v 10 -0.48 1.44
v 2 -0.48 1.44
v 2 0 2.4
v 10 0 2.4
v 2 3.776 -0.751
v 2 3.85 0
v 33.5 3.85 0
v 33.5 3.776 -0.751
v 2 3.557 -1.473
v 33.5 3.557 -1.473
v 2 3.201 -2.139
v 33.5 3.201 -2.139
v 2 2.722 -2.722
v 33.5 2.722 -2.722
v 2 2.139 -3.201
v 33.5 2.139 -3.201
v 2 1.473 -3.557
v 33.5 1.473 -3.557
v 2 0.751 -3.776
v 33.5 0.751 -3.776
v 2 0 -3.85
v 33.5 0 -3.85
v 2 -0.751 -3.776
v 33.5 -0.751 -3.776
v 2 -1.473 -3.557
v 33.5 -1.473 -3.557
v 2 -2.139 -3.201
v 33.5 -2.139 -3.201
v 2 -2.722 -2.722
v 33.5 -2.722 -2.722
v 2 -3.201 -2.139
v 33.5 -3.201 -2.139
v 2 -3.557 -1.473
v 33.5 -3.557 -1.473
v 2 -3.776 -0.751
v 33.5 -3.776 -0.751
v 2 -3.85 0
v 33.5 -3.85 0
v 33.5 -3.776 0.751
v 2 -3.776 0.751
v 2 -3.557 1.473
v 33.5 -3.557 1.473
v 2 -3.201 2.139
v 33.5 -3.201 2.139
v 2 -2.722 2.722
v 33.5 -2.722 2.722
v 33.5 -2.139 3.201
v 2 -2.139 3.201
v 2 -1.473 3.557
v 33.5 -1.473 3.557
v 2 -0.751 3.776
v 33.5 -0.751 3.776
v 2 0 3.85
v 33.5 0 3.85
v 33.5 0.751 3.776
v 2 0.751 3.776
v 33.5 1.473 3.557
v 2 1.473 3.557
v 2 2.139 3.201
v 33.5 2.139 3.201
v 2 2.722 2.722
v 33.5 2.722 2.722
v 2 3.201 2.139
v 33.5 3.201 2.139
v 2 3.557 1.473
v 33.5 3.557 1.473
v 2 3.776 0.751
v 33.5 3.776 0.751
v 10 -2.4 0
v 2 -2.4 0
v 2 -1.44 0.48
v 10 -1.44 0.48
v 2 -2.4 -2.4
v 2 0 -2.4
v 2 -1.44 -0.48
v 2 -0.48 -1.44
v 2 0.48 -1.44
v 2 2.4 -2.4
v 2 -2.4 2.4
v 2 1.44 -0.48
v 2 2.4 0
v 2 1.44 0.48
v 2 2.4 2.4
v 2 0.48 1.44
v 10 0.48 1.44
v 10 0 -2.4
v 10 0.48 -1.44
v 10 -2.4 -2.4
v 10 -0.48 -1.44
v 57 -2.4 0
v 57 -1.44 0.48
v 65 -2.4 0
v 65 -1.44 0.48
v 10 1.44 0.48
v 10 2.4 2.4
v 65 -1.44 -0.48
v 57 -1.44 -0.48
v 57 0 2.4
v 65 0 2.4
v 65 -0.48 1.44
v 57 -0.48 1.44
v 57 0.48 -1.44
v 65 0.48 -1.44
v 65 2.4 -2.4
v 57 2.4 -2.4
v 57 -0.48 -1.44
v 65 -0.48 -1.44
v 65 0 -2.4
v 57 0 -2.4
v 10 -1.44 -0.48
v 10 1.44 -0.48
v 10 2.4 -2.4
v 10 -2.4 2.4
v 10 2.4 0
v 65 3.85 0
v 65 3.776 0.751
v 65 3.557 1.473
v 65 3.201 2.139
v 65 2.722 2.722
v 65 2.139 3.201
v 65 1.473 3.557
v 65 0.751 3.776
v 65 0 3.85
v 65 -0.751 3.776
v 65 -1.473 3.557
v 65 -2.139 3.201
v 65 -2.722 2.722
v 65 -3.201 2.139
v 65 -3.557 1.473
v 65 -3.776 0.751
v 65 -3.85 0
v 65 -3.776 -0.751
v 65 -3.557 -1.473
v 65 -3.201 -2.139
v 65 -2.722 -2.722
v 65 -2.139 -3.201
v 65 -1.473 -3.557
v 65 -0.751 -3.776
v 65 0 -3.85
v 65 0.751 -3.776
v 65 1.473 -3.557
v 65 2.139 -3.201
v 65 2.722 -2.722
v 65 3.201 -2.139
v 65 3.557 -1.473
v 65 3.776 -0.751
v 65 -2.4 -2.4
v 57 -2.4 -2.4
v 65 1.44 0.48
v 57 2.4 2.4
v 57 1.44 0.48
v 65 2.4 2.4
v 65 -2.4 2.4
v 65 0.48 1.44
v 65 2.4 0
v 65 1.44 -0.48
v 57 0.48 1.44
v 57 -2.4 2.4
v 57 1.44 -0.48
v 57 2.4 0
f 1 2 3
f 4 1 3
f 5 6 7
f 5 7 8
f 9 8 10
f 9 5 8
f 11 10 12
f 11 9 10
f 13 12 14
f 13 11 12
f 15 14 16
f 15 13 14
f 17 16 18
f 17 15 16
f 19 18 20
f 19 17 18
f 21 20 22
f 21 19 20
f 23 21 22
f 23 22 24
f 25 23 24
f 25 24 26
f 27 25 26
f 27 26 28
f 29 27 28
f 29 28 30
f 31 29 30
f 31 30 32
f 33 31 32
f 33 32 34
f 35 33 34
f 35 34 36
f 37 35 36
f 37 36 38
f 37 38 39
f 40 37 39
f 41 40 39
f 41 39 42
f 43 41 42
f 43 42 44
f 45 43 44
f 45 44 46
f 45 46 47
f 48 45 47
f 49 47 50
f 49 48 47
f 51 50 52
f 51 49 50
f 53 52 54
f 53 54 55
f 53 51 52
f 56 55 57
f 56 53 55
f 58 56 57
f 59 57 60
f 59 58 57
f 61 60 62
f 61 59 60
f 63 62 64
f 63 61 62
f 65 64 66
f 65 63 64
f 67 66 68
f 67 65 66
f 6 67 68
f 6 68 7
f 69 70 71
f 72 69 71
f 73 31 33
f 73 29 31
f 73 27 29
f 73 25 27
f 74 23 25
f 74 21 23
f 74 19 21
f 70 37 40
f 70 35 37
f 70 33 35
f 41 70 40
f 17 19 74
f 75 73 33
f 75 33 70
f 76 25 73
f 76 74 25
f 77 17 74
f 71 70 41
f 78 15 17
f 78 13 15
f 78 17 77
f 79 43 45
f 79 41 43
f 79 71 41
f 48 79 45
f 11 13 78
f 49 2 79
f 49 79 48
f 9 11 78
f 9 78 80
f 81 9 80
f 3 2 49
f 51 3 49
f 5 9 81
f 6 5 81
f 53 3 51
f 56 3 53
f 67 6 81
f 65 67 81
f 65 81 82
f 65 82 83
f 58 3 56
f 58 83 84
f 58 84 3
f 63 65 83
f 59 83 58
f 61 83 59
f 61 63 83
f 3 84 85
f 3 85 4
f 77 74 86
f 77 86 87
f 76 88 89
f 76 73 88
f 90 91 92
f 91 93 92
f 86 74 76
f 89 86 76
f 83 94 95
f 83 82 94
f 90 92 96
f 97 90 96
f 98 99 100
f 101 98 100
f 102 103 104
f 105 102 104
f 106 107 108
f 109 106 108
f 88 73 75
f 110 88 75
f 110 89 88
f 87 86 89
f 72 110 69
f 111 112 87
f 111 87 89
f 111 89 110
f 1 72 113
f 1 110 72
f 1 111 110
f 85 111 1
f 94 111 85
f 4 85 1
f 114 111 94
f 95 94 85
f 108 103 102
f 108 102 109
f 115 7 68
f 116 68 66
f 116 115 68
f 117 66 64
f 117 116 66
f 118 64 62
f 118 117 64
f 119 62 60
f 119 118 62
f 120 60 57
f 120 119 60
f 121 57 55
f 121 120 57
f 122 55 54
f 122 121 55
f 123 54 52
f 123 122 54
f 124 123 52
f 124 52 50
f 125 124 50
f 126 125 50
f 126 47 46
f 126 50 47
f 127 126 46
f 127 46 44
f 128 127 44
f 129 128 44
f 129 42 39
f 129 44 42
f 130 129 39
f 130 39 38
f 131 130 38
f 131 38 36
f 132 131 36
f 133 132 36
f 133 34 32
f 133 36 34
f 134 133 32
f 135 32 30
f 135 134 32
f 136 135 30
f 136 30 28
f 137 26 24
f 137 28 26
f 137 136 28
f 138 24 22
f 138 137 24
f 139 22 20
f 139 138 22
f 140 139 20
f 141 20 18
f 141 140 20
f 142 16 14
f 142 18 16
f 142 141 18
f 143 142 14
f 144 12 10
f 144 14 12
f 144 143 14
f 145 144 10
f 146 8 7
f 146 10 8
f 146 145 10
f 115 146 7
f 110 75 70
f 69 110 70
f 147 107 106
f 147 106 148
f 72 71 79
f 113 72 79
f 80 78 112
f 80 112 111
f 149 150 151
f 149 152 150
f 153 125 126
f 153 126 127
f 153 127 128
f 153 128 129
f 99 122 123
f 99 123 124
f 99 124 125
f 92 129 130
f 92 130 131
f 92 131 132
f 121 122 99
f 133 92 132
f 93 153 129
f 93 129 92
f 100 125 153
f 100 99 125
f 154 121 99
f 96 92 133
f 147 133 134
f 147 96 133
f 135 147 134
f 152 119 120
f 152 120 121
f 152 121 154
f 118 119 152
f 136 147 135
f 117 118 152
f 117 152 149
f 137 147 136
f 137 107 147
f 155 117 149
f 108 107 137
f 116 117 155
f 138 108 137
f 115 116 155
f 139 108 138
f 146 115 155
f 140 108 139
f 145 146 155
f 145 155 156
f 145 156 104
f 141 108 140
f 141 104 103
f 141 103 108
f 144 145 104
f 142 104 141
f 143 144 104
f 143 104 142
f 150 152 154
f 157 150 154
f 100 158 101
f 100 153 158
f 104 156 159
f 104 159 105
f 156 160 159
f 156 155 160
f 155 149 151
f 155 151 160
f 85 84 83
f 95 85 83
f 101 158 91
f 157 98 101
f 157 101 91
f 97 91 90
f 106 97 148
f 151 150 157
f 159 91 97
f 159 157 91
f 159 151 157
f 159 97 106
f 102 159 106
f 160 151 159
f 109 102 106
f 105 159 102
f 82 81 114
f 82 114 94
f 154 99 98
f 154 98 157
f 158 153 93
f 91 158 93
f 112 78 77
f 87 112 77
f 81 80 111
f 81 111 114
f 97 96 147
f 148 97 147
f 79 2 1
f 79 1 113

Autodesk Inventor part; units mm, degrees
ref_plane "YZ Plane" through (0, 0, 0) normal (1, 0, 0) x (0, 1, 0)
ref_plane "XZ Plane" through (0, 0, 0) normal (0, 1, 0) x (-1, 0, 0)
ref_plane "XY Plane" through (0, 0, 0) normal (0, 0, 1) x (1, 0, 0)
sketch "Sketch1" plane through (0, 0, 0) normal (1, 0, 0) x (0, 1, 0)
  circle A0 centre (0, 0) radius 3.85
  dimension "d0" = 7.7
extrude "Extrusion1" add sketch "Sketch1" along normal blind 5
sketch "Sketch2" plane through (5, 0, 0) normal (1, 0, 0) x (0, 0, -1)
  circle A0 centre (0, 0) radius 3.85
  dimension "d3" = 7.7
extrude "Extrusion2" add sketch "Sketch2" along normal blind 28.5
sketch "Sketch5" plane through (0, 0, 0) normal (-1, 0, 0) x (0, 0, 1)
  circle A0 centre (0, 0) radius 2.4
  line L0 (0, 0) -> (-2.4, 0)
  line L1 (-2.4, 0) -> (-2.4, 2.4)
  line L2 (-2.4, 2.4) -> (0, 2.4)
  line L3 (0, 2.4) -> (0, 0)
  line L4 (-2.4, 2.4) -> (2.4, 2.4)
  line L5 (2.4, 2.4) -> (2.4, -2.4)
  line L6 (2.4, -2.4) -> (-2.4, -2.4)
  line L7 (-2.4, -2.4) -> (-2.4, 2.4)
  line L8 (-2.4, 2.4) -> (2.4, 0)
  line L9 (-2.4, -2.4) -> (2.4, 0)
  line L10 (-2.4, 0) -> (2.4, 2.4)
  line L11 (-2.4, 0) -> (2.4, -2.4)
  line L12 (0, 2.4) -> (2.4, -2.4)
  line L13 (-2.4, -2.4) -> (0, 2.4)
  line L14 (-2.4, 2.4) -> (0, -2.4)
  line L15 (0, -2.4) -> (2.4, 2.4)
  point P0 (1.44, -0.48)
  point P1 (1.44, 0.48)
  point P2 (0.48, 1.44)
  point P3 (-0.48, 1.44)
  point P4 (-1.44, 0.48)
  point P5 (-1.44, -0.48)
  point P6 (-0.48, -1.44)
  point P7 (0.48, -1.44)
  dimension "d23" = 4.8
extrude "Extrusion5" cut sketch "Sketch5" against normal blind 10 contours L9 L12 L15 L8 | L15 L8 L12 L10 A0 | A0 L10 L15 | L12 L11 A0 | A0 L11 L15 L9 L12 | L15 L12 L8 | L9 L15 L12 | L12 L10 L3 | L3 L8 L13 | L14 L9 L11 L15 | L12 L15 L9 L11 L14 L0 L3 L8 | L8 L10 L12 | L15 L11 L9 | L8 L13 L10 L14 A0 | A0 L14 L8 | L10 L13 L8 | L3 L0 L13 L10 | L9 L13 A0 | A0 L13 L11 L14 L9 | L14 L11 L9 | L10 L14 L0 | L0 L13 L11 | L13 L14 L10 | L11 L13 L14
sketch "Sketch7" plane through (0, 0, 0) normal (-1, 0, 0) x (0, 0, 1)
  circle A0 centre (0, 0) radius 3.85
extrude "Extrusion7" cut sketch "Sketch7" against normal blind 2
mirror "Mirror1" about plane through (33.5, 0, 0) normal (1, 0, 0)
properties part number "gear_shaft"
